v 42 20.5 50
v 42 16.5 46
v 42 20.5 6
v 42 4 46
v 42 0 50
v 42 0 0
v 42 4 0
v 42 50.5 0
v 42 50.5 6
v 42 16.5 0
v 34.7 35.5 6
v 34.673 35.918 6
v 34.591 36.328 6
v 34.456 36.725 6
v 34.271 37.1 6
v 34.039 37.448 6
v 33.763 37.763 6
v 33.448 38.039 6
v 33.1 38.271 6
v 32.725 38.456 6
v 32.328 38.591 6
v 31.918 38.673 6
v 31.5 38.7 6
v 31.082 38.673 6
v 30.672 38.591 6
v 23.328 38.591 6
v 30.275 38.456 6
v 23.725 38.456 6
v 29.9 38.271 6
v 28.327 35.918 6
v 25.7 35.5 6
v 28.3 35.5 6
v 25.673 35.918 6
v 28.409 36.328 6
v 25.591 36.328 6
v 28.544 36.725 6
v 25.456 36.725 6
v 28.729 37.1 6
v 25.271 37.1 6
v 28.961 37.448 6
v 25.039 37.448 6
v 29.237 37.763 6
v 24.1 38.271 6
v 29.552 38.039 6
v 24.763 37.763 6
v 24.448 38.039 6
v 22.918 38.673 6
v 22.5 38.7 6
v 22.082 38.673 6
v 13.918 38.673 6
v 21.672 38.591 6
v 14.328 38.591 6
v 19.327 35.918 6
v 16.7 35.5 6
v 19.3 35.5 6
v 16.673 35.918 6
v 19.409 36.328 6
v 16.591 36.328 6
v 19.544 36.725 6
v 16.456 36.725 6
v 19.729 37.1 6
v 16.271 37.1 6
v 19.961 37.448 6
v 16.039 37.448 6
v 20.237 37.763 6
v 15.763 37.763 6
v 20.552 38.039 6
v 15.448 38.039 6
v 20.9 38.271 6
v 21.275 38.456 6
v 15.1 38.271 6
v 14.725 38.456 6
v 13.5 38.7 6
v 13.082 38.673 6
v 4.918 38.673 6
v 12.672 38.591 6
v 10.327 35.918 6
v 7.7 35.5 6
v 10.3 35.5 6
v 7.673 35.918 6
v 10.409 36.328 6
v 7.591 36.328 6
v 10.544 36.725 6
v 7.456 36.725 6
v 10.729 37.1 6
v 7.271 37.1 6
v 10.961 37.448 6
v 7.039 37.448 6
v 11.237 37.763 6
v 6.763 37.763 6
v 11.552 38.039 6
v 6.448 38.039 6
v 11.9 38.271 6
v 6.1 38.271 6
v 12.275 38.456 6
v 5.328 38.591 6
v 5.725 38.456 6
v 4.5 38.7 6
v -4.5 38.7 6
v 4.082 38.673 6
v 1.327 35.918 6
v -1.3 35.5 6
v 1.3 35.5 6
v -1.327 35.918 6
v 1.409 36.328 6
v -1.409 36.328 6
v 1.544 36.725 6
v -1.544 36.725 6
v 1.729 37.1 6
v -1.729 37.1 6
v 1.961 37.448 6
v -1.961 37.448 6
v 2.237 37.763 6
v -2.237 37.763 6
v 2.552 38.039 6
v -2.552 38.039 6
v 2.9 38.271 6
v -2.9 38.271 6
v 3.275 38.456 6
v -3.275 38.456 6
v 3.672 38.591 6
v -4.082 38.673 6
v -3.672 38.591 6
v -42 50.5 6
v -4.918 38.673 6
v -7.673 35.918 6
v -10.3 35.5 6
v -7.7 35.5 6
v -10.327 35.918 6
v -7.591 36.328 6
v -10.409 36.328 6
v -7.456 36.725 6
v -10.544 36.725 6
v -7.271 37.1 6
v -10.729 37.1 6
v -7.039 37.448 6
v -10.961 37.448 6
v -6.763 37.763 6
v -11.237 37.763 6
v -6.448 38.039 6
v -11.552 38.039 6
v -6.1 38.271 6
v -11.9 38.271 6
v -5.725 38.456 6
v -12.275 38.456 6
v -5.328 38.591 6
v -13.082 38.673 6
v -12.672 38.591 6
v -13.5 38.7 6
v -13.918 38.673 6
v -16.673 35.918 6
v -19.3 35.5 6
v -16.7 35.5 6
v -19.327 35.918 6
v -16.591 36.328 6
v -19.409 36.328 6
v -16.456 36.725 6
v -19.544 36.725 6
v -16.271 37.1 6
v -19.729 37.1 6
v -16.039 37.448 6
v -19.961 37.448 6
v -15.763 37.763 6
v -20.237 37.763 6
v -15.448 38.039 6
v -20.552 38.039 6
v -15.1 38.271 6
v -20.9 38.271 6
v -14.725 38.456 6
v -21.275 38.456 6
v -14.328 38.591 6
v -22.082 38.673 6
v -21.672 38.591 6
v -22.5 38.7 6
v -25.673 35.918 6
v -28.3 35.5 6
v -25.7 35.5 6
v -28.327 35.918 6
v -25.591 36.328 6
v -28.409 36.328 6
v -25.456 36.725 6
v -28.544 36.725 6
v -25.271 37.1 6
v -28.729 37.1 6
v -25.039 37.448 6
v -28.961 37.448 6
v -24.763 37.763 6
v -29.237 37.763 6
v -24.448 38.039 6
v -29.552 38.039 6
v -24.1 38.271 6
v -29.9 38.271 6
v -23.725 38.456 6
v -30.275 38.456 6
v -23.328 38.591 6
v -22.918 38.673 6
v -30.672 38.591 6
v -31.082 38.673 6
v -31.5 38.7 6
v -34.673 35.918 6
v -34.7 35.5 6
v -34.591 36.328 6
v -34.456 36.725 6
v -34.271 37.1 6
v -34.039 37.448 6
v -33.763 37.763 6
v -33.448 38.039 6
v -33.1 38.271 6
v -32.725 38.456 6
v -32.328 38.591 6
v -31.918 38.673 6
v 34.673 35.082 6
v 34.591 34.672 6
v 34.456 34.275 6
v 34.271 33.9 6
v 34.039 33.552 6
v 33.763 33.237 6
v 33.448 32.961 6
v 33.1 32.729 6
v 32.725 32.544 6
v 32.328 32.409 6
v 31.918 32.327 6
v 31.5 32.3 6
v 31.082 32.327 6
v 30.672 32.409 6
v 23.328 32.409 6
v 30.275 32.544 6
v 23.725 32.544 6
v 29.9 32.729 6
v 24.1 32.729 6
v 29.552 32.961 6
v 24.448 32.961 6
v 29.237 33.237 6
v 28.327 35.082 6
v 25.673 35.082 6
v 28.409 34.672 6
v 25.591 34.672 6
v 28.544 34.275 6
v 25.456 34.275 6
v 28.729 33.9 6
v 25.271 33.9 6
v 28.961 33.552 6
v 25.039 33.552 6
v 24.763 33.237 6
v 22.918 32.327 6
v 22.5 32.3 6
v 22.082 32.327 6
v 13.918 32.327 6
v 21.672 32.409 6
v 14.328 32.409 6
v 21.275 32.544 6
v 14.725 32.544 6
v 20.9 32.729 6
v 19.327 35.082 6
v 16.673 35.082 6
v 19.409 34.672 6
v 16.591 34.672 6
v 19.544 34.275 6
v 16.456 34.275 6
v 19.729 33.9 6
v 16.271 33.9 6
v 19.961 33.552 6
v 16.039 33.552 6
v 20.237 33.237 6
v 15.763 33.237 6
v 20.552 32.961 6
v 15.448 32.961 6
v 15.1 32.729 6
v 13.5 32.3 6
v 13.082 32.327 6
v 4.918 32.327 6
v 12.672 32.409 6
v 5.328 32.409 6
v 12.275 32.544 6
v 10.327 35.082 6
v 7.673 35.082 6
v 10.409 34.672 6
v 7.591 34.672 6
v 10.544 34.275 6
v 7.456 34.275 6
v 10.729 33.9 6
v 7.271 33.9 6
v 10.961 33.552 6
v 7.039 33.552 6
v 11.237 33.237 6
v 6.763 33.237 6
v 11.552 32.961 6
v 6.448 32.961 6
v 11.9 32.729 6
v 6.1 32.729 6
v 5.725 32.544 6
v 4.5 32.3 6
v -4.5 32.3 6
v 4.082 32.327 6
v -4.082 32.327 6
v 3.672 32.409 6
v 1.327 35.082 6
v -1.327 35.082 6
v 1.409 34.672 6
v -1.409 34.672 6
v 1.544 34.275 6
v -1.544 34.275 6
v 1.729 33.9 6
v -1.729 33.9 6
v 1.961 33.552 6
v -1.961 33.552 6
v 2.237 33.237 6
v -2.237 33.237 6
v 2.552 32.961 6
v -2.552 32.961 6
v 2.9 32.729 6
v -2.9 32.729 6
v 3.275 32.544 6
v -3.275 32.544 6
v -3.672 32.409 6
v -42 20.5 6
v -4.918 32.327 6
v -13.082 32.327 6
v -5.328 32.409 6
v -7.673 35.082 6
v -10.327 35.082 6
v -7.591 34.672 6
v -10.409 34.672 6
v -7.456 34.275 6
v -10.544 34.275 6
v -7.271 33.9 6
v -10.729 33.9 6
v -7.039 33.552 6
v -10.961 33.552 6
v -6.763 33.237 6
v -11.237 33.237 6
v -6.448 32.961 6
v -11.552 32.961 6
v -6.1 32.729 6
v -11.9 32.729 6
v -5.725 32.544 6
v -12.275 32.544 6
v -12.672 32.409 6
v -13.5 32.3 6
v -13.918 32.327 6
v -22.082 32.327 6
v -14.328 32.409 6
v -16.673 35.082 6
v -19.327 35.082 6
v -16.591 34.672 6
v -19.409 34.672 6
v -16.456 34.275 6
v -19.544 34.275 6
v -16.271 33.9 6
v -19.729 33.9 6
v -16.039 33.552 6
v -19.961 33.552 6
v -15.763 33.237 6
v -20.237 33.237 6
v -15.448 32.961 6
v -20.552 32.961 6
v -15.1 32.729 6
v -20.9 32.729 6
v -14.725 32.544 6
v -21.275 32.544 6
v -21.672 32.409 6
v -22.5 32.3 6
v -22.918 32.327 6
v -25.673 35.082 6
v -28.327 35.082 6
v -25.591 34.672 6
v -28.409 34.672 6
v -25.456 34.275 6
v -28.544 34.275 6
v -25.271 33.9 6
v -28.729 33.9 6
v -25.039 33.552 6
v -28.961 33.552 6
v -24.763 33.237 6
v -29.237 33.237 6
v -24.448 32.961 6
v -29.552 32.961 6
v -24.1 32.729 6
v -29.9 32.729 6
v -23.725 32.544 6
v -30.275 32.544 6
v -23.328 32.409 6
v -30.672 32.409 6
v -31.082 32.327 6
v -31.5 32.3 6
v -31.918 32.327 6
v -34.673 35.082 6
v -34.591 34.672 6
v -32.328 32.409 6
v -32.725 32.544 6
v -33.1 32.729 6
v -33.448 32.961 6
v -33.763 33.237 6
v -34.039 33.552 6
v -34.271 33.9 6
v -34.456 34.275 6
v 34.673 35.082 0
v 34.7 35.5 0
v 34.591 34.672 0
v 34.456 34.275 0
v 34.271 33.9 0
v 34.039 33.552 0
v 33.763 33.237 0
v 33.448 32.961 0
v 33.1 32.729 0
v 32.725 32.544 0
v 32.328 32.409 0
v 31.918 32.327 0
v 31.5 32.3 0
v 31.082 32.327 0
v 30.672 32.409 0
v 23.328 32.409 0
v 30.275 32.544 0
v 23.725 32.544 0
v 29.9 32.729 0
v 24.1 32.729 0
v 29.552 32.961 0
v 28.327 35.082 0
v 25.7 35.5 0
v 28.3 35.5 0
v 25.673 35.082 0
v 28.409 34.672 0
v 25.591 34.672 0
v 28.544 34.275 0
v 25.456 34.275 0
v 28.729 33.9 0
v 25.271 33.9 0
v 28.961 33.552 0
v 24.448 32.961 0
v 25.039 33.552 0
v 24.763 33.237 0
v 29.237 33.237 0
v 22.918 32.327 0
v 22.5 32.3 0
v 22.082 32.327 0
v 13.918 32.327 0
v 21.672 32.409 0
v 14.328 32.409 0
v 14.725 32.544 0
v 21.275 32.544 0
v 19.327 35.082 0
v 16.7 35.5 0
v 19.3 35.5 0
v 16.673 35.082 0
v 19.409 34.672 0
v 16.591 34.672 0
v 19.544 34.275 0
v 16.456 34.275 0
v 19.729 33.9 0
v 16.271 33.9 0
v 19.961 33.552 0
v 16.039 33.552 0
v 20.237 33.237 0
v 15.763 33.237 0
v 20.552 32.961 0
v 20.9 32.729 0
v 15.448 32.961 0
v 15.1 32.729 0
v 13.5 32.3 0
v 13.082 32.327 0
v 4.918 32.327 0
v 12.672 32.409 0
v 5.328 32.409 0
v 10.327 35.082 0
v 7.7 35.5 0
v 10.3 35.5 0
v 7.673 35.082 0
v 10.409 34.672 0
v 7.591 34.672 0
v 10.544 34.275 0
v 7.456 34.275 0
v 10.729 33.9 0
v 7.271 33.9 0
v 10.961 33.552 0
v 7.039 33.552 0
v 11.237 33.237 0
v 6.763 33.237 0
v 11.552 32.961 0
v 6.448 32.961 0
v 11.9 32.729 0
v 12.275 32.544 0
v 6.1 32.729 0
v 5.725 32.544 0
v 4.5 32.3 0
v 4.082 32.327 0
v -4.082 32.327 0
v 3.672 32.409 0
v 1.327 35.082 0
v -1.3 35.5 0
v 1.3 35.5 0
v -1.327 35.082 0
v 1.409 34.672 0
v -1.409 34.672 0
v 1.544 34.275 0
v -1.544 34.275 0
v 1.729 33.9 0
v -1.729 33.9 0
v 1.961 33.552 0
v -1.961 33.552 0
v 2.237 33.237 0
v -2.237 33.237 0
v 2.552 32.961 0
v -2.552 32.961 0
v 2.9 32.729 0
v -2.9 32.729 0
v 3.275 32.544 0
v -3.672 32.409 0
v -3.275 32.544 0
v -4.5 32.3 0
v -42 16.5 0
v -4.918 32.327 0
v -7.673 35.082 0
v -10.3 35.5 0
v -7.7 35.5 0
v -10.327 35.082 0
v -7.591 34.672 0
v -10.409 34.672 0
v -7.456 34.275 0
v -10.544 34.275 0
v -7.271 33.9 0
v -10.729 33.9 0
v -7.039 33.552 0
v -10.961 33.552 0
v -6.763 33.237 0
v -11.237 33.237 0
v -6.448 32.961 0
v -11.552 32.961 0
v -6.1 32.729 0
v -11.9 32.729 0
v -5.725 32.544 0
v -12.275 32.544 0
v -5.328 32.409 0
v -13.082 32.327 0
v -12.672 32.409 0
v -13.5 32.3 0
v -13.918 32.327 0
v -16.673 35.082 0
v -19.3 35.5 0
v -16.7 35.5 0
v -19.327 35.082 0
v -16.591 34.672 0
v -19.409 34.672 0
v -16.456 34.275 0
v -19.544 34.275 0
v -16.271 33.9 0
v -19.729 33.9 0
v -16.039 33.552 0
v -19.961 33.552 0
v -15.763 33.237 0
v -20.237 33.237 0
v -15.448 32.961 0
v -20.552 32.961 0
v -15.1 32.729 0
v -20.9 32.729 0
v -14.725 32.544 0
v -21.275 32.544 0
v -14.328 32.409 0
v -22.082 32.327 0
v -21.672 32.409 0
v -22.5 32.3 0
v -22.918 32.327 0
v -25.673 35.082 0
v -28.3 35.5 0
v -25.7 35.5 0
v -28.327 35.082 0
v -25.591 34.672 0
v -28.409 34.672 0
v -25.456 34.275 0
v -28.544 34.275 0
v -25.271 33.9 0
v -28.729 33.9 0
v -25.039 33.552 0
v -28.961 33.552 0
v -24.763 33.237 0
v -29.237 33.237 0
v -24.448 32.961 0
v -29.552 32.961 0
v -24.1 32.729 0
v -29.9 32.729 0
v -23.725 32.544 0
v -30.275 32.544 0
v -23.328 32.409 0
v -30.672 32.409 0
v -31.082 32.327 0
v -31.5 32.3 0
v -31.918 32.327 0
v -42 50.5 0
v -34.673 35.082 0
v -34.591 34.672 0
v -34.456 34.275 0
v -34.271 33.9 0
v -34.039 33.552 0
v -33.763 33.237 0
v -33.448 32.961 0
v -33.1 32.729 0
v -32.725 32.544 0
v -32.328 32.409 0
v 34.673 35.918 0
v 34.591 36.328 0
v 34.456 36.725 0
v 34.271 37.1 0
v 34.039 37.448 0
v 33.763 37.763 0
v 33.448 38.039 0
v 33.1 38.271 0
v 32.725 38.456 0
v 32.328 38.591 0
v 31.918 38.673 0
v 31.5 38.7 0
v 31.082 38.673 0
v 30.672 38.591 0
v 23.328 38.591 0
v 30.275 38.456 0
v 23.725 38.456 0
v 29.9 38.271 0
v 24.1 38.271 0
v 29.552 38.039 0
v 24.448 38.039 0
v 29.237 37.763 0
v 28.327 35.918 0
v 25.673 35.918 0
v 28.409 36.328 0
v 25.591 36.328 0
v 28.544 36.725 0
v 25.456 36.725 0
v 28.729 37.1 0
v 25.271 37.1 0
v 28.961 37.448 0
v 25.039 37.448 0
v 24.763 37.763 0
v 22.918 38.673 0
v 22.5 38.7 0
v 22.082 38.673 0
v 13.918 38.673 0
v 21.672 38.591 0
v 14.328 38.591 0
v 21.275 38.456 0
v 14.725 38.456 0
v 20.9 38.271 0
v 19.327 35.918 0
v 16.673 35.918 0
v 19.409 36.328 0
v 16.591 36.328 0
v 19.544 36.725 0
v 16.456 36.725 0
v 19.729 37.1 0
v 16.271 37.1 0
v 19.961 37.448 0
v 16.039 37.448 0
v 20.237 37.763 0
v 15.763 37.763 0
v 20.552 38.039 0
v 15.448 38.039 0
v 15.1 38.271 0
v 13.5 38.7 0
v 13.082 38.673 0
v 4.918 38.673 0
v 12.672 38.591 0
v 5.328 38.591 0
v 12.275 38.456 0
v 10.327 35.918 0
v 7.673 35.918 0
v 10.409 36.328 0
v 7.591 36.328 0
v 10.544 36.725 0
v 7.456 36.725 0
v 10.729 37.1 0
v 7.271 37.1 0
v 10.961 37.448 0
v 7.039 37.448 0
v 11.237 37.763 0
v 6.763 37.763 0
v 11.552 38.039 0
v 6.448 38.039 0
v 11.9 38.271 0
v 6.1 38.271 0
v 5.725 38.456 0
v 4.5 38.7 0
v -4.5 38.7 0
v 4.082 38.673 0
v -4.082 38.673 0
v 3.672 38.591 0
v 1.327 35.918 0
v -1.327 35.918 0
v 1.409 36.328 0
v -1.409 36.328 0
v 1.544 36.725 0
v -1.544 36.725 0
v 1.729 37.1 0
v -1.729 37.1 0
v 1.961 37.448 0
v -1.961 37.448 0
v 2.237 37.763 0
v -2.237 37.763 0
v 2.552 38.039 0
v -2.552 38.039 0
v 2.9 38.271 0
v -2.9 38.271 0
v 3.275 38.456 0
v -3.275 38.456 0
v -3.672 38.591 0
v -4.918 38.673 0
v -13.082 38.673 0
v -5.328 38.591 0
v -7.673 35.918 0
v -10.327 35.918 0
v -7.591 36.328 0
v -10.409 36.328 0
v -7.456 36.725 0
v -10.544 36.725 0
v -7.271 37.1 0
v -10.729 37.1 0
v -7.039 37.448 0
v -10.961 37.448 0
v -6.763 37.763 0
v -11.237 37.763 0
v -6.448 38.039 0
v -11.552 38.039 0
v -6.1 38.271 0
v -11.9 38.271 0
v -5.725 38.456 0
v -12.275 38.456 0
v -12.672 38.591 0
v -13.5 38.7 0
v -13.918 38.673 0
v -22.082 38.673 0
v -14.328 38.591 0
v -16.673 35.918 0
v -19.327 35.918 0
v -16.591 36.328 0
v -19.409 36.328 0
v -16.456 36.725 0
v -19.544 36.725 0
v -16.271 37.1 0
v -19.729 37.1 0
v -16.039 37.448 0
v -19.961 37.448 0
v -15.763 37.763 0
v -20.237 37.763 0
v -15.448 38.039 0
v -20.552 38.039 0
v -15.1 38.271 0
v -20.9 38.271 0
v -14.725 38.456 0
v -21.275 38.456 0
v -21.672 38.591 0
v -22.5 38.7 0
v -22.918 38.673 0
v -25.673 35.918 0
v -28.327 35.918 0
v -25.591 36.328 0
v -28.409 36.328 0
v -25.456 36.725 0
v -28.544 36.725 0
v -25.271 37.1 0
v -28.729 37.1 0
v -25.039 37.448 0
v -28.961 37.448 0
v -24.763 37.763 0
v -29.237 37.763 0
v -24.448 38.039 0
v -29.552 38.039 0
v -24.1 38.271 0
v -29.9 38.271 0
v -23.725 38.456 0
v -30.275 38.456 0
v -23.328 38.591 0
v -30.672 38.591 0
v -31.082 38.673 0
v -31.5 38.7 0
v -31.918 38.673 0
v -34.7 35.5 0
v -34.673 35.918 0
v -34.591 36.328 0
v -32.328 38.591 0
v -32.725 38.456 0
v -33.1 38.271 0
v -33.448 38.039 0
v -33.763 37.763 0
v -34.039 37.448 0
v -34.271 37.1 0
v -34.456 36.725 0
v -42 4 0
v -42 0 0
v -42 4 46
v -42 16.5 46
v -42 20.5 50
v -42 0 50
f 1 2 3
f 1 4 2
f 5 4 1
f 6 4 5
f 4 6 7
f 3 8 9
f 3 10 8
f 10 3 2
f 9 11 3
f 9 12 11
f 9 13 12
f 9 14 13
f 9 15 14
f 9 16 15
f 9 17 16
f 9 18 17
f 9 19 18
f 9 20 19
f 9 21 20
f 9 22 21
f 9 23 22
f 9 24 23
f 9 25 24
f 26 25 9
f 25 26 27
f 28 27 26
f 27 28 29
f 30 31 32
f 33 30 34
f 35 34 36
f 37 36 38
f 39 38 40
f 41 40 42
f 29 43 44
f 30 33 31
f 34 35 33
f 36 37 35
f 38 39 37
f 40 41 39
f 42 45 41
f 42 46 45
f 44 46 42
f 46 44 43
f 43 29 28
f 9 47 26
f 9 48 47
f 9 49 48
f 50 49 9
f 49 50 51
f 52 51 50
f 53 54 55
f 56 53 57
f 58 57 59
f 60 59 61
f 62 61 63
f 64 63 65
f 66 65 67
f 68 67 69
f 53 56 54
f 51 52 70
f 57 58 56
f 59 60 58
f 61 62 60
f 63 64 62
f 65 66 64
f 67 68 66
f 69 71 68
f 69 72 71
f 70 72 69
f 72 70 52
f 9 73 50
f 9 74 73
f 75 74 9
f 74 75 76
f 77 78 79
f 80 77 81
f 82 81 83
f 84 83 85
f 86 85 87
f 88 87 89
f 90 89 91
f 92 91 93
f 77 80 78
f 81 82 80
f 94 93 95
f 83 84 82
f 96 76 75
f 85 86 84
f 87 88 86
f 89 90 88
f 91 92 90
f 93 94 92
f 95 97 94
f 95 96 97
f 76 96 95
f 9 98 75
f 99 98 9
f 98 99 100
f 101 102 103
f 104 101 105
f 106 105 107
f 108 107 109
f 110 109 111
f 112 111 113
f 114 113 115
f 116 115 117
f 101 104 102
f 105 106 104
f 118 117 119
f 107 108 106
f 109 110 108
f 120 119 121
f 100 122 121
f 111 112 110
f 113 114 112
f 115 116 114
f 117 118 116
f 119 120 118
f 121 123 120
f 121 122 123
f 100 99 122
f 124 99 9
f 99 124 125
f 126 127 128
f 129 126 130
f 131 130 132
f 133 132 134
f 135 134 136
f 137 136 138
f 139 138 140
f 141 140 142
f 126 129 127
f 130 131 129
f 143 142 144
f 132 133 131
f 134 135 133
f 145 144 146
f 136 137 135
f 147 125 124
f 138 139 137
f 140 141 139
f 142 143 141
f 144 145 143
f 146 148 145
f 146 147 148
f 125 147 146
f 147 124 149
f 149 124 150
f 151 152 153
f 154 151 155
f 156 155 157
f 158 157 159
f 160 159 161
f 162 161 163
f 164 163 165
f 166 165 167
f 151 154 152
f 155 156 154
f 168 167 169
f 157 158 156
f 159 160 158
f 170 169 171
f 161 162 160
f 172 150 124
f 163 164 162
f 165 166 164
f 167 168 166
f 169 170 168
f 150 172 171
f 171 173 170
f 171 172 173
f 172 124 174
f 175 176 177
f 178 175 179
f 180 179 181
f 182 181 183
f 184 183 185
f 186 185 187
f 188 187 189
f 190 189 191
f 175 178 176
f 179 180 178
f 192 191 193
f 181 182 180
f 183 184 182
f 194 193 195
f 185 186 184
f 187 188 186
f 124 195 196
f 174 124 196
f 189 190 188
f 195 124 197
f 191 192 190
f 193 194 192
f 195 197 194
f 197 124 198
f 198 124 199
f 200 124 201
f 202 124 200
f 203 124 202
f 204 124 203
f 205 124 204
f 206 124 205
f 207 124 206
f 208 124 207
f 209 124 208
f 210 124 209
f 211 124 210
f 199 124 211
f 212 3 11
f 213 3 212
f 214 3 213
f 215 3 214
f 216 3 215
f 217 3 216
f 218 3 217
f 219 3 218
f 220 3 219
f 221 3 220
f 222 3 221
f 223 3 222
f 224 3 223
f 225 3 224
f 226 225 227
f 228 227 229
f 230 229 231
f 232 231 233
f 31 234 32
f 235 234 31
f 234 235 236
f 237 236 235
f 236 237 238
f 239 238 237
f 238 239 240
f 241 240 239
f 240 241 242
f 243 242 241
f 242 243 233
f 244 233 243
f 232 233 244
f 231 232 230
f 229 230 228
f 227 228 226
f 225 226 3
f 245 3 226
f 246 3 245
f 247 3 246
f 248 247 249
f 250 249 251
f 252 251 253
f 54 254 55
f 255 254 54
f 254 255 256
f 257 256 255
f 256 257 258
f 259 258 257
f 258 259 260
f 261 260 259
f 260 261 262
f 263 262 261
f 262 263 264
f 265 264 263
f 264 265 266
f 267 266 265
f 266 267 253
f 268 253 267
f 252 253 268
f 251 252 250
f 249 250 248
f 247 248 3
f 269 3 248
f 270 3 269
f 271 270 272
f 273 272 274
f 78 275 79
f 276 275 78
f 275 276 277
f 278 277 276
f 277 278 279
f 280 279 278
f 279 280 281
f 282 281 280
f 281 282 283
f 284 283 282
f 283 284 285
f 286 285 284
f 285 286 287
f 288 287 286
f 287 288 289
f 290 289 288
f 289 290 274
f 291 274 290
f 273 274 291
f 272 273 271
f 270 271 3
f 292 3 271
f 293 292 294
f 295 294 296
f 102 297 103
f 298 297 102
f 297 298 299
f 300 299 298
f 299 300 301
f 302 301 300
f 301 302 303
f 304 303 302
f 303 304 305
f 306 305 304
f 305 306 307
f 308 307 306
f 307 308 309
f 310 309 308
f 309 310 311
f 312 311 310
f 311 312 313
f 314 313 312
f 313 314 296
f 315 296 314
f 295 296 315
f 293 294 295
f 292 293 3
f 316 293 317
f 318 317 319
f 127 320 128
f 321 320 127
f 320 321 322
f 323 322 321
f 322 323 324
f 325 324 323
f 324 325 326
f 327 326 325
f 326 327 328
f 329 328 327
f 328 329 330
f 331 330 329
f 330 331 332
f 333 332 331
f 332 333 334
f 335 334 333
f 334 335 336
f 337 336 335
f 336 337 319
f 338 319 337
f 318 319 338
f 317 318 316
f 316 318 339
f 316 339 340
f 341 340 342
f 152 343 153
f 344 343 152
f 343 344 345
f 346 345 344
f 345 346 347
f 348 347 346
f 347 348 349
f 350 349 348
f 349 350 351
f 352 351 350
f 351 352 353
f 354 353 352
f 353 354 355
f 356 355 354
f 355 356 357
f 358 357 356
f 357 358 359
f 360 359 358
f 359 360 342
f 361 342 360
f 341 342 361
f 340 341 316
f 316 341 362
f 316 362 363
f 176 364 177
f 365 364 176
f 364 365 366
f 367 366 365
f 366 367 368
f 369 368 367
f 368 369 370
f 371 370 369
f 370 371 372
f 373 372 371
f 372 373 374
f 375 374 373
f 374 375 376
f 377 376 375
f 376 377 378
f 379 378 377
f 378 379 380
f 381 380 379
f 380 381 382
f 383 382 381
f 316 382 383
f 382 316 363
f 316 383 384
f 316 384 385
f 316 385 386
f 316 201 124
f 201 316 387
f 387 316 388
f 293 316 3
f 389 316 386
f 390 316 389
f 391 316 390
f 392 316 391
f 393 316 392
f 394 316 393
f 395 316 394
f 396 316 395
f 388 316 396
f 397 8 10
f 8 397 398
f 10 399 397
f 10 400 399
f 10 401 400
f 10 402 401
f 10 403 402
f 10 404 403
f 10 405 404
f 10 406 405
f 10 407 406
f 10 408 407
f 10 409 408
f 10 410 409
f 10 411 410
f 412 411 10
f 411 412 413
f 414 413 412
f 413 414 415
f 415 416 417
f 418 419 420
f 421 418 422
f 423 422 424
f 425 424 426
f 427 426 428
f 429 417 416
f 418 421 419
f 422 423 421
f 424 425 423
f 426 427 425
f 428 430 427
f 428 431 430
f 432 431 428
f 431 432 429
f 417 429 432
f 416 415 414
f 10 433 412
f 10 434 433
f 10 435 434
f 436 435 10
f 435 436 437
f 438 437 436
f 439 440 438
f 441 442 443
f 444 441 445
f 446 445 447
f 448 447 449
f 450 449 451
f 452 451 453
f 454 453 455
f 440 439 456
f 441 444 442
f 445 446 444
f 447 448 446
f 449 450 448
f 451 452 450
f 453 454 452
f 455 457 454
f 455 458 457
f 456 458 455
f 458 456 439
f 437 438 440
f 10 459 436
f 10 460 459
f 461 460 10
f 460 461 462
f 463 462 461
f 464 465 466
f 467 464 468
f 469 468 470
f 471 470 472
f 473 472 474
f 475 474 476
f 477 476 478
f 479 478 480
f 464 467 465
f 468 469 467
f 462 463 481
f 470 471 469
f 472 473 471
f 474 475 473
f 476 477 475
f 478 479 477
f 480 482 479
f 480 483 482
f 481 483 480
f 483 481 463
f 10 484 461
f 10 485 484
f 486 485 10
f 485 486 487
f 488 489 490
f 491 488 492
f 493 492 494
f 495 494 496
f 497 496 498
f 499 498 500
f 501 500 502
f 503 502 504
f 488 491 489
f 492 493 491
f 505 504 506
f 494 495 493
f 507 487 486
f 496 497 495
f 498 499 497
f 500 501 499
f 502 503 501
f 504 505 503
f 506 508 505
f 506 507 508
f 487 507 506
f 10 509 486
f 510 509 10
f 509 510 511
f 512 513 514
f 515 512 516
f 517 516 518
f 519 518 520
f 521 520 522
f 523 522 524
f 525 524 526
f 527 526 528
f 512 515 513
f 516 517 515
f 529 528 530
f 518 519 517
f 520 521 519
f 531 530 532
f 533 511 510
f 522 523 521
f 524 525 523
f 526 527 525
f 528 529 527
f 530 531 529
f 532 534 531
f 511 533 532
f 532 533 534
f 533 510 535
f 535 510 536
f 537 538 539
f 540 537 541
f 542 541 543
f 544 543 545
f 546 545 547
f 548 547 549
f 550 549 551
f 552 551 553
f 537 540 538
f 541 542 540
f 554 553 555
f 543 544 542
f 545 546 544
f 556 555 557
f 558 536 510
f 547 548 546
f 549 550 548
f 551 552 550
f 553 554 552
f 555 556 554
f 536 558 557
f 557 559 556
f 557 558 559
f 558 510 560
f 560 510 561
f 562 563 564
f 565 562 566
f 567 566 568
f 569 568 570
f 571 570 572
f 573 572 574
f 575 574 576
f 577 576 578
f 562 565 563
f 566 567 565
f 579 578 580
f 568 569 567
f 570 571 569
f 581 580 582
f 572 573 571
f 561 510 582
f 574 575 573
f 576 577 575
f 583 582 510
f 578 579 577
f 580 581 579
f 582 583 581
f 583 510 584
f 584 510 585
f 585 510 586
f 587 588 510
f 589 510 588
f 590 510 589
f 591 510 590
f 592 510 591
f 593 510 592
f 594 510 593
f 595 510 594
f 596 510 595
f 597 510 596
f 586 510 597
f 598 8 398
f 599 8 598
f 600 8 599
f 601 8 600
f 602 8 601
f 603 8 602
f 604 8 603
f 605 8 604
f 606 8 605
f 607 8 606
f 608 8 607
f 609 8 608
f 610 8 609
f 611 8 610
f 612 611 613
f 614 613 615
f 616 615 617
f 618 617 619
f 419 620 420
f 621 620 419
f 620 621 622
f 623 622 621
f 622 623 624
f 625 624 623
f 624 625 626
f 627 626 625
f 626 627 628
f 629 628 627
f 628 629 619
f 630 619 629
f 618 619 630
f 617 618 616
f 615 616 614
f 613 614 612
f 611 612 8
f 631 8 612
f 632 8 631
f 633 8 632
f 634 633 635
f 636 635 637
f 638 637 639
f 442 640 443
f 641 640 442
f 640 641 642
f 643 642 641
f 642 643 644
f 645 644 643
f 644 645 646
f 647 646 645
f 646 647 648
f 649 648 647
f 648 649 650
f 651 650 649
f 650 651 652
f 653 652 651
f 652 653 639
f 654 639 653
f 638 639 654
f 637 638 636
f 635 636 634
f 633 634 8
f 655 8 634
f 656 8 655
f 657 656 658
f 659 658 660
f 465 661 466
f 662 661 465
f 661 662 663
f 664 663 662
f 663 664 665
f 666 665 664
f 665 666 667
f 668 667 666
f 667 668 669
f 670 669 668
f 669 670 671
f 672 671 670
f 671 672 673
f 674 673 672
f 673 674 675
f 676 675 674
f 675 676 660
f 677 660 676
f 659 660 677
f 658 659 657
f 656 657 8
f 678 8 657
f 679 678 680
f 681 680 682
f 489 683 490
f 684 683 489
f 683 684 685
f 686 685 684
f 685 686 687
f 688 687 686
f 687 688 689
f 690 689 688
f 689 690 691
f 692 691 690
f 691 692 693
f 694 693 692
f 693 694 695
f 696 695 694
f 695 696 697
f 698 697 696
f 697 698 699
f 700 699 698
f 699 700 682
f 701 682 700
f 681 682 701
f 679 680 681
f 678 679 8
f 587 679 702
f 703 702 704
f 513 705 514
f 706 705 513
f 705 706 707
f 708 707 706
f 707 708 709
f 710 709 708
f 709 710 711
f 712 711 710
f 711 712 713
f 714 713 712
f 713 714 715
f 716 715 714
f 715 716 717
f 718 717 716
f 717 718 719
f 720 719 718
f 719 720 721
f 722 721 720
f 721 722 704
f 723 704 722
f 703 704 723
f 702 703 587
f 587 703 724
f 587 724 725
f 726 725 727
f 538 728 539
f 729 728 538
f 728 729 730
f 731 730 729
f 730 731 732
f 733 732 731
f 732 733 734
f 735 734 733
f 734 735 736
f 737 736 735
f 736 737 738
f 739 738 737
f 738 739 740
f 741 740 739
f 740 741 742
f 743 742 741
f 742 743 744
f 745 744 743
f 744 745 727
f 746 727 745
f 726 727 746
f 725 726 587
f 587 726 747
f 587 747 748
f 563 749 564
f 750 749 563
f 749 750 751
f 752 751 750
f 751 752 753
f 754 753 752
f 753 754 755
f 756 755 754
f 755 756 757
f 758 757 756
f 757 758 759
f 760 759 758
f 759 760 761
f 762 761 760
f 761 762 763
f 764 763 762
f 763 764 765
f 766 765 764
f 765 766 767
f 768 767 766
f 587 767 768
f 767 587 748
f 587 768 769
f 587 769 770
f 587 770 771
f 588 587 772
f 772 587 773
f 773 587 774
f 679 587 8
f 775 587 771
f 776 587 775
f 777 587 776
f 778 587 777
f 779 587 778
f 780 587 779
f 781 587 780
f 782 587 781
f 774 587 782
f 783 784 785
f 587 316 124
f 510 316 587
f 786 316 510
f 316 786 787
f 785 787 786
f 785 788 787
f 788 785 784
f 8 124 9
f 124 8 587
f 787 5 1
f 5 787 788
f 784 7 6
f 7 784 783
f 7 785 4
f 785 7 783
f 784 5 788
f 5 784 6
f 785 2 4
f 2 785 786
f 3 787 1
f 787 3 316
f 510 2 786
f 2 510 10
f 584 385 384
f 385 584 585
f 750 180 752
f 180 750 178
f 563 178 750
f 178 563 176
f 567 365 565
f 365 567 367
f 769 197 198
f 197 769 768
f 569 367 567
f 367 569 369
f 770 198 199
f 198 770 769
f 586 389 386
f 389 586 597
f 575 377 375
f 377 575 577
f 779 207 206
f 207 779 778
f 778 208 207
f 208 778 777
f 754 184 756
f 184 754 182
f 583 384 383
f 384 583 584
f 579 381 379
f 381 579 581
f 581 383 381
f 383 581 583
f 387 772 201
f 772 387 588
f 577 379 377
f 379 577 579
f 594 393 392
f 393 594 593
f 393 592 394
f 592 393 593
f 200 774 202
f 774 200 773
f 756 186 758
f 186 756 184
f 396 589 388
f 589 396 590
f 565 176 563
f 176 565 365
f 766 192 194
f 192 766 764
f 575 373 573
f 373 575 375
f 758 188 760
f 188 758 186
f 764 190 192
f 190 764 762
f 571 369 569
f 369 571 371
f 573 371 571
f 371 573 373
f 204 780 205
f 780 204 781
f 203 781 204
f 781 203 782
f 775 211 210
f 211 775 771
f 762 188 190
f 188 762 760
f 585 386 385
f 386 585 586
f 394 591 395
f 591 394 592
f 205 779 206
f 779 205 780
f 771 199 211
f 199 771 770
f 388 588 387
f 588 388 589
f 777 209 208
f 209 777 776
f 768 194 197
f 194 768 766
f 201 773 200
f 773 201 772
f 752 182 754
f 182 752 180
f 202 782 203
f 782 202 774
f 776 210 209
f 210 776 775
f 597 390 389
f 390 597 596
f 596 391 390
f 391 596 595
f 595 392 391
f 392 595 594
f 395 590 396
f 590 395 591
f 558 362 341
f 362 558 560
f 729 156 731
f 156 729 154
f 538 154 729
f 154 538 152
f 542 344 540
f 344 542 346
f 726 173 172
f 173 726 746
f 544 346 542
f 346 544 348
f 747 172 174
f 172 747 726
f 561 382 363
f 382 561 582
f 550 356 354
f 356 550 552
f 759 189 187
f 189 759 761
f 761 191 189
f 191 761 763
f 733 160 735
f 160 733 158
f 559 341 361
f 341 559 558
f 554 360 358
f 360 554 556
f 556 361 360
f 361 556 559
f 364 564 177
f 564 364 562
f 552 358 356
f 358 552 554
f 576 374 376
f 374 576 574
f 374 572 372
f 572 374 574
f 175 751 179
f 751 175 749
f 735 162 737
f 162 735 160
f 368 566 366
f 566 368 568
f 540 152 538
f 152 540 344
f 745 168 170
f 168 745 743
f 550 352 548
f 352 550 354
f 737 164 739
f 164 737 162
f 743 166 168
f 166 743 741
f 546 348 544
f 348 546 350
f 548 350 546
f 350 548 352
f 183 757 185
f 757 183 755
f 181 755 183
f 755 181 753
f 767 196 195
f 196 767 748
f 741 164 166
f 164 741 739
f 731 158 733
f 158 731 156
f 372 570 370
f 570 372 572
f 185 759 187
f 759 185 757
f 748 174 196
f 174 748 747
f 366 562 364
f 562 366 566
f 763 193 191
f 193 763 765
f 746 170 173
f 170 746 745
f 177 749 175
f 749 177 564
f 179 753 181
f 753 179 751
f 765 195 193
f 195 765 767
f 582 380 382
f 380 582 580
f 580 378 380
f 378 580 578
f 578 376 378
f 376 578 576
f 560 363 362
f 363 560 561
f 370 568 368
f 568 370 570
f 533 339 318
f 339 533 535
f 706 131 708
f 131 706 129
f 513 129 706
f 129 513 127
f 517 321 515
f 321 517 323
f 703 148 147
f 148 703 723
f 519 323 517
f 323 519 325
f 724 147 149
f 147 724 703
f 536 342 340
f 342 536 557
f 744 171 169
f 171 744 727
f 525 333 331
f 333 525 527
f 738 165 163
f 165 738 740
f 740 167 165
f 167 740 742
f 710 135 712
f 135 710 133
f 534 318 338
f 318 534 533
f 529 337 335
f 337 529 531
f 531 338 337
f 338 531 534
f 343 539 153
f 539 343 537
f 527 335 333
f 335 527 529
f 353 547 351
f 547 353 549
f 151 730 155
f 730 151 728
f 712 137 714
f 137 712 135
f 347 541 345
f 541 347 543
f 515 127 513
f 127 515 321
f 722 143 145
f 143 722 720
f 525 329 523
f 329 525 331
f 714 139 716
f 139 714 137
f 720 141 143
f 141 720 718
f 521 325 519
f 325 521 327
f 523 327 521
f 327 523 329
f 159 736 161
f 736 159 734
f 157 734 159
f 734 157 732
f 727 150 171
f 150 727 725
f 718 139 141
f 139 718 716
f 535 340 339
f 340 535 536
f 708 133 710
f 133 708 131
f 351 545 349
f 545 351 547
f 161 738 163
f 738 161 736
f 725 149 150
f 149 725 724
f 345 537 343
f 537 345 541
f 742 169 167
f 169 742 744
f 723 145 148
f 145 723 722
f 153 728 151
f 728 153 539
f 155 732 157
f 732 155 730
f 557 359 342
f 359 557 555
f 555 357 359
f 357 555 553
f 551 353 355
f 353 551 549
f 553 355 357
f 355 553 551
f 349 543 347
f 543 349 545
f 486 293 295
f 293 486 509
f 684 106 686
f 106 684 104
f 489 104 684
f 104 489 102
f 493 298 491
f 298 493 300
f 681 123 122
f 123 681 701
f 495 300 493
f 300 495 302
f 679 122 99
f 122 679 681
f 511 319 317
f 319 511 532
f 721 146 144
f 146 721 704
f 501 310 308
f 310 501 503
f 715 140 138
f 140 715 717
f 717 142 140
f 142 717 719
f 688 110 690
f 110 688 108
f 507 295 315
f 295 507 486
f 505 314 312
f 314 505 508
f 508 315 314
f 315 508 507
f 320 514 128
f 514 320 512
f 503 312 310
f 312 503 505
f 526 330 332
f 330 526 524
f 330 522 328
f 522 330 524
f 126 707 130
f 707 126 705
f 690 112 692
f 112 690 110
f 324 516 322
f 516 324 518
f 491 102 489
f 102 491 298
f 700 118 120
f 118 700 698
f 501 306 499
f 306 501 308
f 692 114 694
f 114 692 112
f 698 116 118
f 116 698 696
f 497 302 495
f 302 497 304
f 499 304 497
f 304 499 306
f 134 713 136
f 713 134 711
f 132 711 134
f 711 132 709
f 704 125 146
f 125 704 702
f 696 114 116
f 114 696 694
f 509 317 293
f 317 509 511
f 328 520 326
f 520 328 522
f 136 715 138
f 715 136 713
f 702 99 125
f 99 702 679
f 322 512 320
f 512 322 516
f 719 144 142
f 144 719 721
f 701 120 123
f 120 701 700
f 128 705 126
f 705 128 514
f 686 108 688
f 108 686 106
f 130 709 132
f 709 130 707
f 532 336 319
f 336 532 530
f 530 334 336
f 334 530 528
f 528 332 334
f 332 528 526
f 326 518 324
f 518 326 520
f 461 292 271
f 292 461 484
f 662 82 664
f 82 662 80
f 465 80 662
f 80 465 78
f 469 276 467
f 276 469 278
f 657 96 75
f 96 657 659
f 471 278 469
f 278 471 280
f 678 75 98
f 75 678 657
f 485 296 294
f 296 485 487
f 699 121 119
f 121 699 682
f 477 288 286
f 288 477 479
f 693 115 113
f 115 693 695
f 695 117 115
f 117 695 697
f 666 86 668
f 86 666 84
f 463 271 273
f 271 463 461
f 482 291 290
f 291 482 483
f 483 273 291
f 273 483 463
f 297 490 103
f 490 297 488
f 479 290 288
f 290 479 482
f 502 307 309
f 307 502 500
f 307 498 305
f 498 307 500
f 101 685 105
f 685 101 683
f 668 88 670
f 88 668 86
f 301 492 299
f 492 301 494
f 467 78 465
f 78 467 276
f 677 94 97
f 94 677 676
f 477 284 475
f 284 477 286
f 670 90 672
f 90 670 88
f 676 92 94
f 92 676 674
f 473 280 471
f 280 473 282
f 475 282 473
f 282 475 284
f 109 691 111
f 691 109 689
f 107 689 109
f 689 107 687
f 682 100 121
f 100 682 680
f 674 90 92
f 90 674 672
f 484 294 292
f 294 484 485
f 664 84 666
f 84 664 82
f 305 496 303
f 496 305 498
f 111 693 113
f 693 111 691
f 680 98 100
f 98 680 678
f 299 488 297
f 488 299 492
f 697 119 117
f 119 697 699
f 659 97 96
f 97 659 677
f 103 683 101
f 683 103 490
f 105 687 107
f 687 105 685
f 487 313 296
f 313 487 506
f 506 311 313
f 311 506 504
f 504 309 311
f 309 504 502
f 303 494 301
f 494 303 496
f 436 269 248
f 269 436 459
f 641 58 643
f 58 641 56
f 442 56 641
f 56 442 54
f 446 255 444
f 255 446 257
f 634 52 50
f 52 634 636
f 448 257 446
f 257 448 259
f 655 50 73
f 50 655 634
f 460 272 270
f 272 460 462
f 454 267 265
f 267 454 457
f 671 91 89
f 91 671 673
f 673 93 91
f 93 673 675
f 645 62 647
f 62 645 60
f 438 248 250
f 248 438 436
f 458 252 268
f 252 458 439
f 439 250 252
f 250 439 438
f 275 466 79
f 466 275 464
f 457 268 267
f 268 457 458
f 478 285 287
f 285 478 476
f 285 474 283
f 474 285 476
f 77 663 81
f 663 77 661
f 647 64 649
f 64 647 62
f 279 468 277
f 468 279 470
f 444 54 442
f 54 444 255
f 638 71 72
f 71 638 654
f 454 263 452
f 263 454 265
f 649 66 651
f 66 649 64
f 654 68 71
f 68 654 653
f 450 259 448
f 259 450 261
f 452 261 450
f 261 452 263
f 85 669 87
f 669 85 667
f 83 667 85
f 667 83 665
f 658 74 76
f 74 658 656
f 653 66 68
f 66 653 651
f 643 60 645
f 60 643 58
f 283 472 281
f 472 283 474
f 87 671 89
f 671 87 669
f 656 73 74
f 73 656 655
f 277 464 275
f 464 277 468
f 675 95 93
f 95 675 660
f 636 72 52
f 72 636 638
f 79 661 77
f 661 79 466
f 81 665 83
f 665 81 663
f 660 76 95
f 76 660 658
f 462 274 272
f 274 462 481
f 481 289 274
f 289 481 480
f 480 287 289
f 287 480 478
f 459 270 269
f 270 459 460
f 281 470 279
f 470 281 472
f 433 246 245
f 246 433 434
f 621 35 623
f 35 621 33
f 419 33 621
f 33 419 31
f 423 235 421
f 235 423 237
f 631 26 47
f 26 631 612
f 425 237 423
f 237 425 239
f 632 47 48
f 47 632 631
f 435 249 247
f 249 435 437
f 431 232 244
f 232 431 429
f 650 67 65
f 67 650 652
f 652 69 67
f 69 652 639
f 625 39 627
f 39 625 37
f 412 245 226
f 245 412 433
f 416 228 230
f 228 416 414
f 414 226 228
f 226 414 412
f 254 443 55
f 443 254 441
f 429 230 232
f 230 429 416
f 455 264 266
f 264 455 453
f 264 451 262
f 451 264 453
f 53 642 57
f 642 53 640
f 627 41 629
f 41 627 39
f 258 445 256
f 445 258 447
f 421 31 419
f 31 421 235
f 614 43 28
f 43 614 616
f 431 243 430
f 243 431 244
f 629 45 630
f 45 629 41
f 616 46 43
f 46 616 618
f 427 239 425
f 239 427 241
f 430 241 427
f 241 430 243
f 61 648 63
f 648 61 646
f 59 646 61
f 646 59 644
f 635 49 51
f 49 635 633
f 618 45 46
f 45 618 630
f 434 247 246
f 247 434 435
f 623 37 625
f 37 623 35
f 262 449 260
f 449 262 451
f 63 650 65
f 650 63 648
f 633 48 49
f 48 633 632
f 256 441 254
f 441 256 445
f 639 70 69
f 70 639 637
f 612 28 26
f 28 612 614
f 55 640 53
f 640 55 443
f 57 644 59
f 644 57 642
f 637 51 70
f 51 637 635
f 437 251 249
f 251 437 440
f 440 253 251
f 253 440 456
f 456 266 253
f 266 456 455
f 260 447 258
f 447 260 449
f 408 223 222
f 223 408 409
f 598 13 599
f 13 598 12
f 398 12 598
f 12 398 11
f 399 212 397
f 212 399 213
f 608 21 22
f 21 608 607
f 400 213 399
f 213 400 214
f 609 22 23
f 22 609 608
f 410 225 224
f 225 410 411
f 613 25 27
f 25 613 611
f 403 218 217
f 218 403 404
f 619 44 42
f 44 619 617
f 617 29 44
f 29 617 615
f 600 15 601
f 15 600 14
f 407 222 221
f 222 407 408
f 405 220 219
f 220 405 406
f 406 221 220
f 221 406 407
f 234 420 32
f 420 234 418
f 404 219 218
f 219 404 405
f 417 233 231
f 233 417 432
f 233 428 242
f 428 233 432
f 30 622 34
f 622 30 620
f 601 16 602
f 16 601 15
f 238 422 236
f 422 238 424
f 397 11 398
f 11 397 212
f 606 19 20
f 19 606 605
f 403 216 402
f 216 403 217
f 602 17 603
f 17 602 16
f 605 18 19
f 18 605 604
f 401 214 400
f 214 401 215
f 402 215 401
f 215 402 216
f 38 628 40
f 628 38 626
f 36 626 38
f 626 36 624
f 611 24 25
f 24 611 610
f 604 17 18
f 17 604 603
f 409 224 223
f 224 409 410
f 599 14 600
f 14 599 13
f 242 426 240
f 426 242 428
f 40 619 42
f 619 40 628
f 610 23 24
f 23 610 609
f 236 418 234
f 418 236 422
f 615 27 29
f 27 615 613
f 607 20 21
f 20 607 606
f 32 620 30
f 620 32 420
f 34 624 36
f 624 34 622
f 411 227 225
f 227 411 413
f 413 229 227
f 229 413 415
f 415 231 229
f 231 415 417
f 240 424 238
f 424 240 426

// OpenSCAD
// KNOWN-RIGHT ALTERNATIVE (must pass): the ledge on the other leg: the mirror image, which hangs the same way round the wall
// Holder that hangs one 8-tube PCR strip inside an ice bucket, hooked over its 12 mm wall
// Category: quick fixes. An upside-down U (two legs and a bridge) that fits over the wall, and a
// ledge at the foot of the inner leg with eight tube holes, so the tubes sit down in the ice.
// Print: PLA or PETG, as used (both legs and the ledge on the bed); the bridge spans 12.5 mm.
// SPDX-License-Identifier: CERN-OHL-P-2.0

/* [Hanger] */
length = 84;              // along X, centred
leg_t = 4;
gap = 12.5;               // 12 mm bucket wall + clearance
leg_h = 50;               // both legs from z = 0 to 50
bridge_t = 4;             // bridge from z = 46 to 50
ledge = [30, 6];          // ledge reaches 30 mm toward -Y, 6 mm thick
hole_d = 6.4;
n = 8;
pitch = 9;
hole_y = -15;

/* [Hidden] */
eps = 0.01;
outer_y = leg_t + gap;    // outer leg from y = 16.5 to 20.5

difference() {
    union() {
        translate([-length / 2, outer_y + leg_t - eps, 0]) cube([length, ledge[0] + eps, ledge[1]]);
        translate([-length / 2, 0, 0]) cube([length, leg_t, leg_h]);
        translate([-length / 2, 0, leg_h - bridge_t]) cube([length, outer_y + leg_t, bridge_t]);
        translate([-length / 2, outer_y, 0]) cube([length, leg_t, leg_h]);
    }
    for (i = [0 : n - 1])
        translate([(i - (n - 1) / 2) * pitch, outer_y + leg_t - hole_y, -1]) cylinder(d = hole_d, h = ledge[1] + 2, $fn = 48);
}
